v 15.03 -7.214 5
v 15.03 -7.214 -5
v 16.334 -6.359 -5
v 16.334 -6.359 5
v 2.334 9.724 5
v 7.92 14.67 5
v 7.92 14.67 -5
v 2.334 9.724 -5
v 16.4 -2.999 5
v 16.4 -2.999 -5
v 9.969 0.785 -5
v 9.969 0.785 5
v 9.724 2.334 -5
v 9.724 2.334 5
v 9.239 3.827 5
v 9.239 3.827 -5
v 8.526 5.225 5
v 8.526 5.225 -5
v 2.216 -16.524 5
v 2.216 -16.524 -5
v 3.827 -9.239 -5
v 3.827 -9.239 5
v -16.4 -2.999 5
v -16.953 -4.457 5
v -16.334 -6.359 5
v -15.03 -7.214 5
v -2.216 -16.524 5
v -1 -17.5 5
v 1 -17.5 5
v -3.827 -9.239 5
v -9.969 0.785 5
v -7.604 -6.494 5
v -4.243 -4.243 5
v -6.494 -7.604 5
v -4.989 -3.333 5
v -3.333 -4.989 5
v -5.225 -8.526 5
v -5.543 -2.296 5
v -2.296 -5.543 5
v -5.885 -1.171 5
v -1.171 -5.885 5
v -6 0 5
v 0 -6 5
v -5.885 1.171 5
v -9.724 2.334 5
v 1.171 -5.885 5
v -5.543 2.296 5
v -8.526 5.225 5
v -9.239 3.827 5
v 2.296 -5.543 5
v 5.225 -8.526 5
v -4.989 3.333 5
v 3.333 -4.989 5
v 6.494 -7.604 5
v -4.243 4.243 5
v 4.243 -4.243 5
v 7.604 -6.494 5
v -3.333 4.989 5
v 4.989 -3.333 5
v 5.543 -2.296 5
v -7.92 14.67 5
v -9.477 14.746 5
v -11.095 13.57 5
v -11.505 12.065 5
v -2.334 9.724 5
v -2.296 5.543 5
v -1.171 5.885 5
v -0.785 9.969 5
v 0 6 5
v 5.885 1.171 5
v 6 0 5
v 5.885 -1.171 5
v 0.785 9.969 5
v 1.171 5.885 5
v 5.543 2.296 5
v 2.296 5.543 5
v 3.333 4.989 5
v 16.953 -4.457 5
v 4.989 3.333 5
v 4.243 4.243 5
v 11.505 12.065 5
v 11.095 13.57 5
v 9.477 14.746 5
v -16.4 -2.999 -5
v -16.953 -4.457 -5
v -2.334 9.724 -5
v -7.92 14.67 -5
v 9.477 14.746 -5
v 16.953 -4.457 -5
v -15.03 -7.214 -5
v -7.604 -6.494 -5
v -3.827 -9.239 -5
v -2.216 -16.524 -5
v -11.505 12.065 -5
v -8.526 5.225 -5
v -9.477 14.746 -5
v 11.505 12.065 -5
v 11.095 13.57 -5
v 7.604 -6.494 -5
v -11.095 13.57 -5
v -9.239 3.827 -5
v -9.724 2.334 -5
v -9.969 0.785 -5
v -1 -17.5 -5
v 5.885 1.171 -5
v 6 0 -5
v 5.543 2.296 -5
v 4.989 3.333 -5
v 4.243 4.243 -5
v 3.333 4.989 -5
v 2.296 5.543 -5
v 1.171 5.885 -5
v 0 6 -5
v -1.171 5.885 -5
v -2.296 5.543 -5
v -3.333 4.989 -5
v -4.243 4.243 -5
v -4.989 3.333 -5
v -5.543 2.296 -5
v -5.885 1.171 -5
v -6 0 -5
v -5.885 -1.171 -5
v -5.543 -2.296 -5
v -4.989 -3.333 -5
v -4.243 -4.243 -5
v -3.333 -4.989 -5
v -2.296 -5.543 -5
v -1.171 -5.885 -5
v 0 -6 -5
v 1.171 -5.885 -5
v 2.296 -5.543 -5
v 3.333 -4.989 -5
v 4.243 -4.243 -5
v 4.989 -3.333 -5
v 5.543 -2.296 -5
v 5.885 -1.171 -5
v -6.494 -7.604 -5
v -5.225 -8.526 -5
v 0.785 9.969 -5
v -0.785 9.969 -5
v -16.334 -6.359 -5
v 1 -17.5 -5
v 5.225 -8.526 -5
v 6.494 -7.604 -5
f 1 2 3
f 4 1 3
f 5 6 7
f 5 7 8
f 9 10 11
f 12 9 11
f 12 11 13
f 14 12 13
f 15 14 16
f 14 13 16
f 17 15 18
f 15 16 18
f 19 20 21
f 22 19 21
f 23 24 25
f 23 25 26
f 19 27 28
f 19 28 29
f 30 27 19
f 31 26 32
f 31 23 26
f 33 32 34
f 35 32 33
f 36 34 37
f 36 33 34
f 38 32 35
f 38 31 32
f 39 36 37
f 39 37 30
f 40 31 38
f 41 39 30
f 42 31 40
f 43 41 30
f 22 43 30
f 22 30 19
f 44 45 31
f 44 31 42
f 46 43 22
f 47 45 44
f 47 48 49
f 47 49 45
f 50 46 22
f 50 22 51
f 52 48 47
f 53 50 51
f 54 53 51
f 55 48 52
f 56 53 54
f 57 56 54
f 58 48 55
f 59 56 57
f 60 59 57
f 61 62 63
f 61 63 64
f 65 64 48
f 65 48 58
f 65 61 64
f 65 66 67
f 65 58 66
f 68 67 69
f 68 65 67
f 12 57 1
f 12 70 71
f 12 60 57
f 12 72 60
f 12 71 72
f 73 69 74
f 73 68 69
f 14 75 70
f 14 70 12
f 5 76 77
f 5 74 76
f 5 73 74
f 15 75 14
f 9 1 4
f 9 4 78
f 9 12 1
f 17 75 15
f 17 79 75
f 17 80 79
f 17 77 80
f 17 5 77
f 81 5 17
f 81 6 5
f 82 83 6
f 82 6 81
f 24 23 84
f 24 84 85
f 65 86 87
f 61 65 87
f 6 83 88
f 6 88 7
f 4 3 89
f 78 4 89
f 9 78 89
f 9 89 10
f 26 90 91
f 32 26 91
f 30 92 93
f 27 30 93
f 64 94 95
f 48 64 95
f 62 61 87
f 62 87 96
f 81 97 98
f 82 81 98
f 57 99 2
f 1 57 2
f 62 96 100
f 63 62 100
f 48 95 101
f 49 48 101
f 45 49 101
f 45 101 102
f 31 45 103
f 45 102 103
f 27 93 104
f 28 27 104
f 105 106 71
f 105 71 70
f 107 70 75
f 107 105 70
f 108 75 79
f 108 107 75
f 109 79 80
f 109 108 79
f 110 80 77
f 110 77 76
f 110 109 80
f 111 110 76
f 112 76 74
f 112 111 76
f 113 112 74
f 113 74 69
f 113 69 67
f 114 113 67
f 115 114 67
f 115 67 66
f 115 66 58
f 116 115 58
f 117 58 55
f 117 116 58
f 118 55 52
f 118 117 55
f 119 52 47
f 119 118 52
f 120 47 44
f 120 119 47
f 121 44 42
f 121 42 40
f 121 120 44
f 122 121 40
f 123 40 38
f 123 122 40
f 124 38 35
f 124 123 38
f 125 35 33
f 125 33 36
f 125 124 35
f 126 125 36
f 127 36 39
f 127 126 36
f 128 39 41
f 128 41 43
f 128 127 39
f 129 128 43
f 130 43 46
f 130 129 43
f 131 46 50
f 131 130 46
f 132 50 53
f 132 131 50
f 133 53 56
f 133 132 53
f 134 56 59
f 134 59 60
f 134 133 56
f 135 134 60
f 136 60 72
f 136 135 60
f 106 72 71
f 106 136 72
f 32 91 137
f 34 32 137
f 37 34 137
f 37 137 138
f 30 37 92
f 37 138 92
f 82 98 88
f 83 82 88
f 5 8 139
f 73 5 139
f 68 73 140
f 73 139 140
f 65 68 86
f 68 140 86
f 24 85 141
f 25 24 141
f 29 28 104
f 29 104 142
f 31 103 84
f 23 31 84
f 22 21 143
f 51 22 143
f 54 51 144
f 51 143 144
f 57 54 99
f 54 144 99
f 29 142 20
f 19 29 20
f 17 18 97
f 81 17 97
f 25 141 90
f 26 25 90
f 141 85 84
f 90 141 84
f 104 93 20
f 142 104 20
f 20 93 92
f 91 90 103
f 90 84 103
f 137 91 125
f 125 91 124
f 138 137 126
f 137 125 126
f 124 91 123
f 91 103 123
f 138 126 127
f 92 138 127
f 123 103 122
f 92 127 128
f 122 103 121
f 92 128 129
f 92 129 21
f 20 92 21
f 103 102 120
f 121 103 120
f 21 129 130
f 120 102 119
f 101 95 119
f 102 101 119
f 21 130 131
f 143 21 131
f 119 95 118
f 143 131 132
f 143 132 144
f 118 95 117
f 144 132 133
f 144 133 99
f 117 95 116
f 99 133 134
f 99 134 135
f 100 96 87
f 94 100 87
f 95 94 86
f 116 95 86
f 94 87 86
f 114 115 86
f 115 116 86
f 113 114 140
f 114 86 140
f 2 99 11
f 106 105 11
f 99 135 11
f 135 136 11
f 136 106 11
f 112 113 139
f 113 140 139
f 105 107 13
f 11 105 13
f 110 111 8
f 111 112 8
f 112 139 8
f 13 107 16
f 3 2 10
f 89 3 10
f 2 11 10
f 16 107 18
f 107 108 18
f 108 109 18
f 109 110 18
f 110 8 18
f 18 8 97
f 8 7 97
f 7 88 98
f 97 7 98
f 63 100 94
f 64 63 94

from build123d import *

# Parameters (mm, degrees)
BOSS_EXTRUDE1_DEPTH      = 5
BOSS_EXTRUDE1_DEPTH_BACK = 5
SKETCH1_R                = 6


with BuildPart() as part:
    # Sketch1 → Boss-Extrude1 (new, two sides: drawn at the far end of the back side and taken through both)
    with BuildSketch(Plane.XY.offset(-BOSS_EXTRUDE1_DEPTH_BACK)):
        with BuildLine():
            Line((-1, -17.5), (1, -17.5))
            Line((1, -17.5), (2.215917914, -16.523588481))
            Line((2.215917914, -16.523588481), (3.826834324, -9.238795325))
            ThreePointArc((3.826834324, -9.238795325), (5.877852523, -8.090169944), (7.604059656, -6.494480483))
            Line((7.604059656, -6.494480483), (15.030110204, -7.21353282))
            Line((15.030110204, -7.21353282), (16.334472041, -6.358853918))
            Line((16.334472041, -6.358853918), (16.95250603, -4.456740885))
            Line((16.95250603, -4.456740885), (16.399622791, -2.998606477))
            Line((16.399622791, -2.998606477), (9.969173337, 0.784590957))
            ThreePointArc((9.969173337, 0.784590957), (9.510565163, 3.090169944), (8.526401644, 5.224985647))
            Line((8.526401644, 5.224985647), (11.505036874, 12.065380019))
            Line((11.505036874, 12.065380019), (11.095258909, 13.570012149))
            Line((11.095258909, 13.570012149), (9.477224921, 14.745582654))
            Line((9.477224921, 14.745582654), (7.919606374, 14.670347759))
            Line((7.919606374, 14.670347759), (2.334453639, 9.723699204))
            ThreePointArc((2.334453639, 9.723699204), (0, 10), (-2.334453639, 9.723699204))
            Line((-2.334453639, 9.723699204), (-7.919606374, 14.670347759))
            Line((-7.919606374, 14.670347759), (-9.477224921, 14.745582654))
            Line((-9.477224921, 14.745582654), (-11.095258909, 13.570012149))
            Line((-11.095258909, 13.570012149), (-11.505036874, 12.065380019))
            Line((-11.505036874, 12.065380019), (-8.526401644, 5.224985647))
            ThreePointArc((-8.526401644, 5.224985647), (-9.510565163, 3.090169944), (-9.969173337, 0.784590957))
            Line((-9.969173337, 0.784590957), (-16.399622791, -2.998606477))
            Line((-16.399622791, -2.998606477), (-16.95250603, -4.456740885))
            Line((-16.95250603, -4.456740885), (-16.334472041, -6.358853918))
            Line((-16.334472041, -6.358853918), (-15.030110204, -7.21353282))
            Line((-15.030110204, -7.21353282), (-7.604059656, -6.494480483))
            ThreePointArc((-7.604059656, -6.494480483), (-5.877852523, -8.090169944), (-3.826834324, -9.238795325))
            Line((-3.826834324, -9.238795325), (-2.215917914, -16.523588481))
            Line((-2.215917914, -16.523588481), (-1, -17.5))
        make_face()
        Circle(SKETCH1_R, mode=Mode.SUBTRACT)
    extrude(amount=BOSS_EXTRUDE1_DEPTH + BOSS_EXTRUDE1_DEPTH_BACK)


solid = part.part
